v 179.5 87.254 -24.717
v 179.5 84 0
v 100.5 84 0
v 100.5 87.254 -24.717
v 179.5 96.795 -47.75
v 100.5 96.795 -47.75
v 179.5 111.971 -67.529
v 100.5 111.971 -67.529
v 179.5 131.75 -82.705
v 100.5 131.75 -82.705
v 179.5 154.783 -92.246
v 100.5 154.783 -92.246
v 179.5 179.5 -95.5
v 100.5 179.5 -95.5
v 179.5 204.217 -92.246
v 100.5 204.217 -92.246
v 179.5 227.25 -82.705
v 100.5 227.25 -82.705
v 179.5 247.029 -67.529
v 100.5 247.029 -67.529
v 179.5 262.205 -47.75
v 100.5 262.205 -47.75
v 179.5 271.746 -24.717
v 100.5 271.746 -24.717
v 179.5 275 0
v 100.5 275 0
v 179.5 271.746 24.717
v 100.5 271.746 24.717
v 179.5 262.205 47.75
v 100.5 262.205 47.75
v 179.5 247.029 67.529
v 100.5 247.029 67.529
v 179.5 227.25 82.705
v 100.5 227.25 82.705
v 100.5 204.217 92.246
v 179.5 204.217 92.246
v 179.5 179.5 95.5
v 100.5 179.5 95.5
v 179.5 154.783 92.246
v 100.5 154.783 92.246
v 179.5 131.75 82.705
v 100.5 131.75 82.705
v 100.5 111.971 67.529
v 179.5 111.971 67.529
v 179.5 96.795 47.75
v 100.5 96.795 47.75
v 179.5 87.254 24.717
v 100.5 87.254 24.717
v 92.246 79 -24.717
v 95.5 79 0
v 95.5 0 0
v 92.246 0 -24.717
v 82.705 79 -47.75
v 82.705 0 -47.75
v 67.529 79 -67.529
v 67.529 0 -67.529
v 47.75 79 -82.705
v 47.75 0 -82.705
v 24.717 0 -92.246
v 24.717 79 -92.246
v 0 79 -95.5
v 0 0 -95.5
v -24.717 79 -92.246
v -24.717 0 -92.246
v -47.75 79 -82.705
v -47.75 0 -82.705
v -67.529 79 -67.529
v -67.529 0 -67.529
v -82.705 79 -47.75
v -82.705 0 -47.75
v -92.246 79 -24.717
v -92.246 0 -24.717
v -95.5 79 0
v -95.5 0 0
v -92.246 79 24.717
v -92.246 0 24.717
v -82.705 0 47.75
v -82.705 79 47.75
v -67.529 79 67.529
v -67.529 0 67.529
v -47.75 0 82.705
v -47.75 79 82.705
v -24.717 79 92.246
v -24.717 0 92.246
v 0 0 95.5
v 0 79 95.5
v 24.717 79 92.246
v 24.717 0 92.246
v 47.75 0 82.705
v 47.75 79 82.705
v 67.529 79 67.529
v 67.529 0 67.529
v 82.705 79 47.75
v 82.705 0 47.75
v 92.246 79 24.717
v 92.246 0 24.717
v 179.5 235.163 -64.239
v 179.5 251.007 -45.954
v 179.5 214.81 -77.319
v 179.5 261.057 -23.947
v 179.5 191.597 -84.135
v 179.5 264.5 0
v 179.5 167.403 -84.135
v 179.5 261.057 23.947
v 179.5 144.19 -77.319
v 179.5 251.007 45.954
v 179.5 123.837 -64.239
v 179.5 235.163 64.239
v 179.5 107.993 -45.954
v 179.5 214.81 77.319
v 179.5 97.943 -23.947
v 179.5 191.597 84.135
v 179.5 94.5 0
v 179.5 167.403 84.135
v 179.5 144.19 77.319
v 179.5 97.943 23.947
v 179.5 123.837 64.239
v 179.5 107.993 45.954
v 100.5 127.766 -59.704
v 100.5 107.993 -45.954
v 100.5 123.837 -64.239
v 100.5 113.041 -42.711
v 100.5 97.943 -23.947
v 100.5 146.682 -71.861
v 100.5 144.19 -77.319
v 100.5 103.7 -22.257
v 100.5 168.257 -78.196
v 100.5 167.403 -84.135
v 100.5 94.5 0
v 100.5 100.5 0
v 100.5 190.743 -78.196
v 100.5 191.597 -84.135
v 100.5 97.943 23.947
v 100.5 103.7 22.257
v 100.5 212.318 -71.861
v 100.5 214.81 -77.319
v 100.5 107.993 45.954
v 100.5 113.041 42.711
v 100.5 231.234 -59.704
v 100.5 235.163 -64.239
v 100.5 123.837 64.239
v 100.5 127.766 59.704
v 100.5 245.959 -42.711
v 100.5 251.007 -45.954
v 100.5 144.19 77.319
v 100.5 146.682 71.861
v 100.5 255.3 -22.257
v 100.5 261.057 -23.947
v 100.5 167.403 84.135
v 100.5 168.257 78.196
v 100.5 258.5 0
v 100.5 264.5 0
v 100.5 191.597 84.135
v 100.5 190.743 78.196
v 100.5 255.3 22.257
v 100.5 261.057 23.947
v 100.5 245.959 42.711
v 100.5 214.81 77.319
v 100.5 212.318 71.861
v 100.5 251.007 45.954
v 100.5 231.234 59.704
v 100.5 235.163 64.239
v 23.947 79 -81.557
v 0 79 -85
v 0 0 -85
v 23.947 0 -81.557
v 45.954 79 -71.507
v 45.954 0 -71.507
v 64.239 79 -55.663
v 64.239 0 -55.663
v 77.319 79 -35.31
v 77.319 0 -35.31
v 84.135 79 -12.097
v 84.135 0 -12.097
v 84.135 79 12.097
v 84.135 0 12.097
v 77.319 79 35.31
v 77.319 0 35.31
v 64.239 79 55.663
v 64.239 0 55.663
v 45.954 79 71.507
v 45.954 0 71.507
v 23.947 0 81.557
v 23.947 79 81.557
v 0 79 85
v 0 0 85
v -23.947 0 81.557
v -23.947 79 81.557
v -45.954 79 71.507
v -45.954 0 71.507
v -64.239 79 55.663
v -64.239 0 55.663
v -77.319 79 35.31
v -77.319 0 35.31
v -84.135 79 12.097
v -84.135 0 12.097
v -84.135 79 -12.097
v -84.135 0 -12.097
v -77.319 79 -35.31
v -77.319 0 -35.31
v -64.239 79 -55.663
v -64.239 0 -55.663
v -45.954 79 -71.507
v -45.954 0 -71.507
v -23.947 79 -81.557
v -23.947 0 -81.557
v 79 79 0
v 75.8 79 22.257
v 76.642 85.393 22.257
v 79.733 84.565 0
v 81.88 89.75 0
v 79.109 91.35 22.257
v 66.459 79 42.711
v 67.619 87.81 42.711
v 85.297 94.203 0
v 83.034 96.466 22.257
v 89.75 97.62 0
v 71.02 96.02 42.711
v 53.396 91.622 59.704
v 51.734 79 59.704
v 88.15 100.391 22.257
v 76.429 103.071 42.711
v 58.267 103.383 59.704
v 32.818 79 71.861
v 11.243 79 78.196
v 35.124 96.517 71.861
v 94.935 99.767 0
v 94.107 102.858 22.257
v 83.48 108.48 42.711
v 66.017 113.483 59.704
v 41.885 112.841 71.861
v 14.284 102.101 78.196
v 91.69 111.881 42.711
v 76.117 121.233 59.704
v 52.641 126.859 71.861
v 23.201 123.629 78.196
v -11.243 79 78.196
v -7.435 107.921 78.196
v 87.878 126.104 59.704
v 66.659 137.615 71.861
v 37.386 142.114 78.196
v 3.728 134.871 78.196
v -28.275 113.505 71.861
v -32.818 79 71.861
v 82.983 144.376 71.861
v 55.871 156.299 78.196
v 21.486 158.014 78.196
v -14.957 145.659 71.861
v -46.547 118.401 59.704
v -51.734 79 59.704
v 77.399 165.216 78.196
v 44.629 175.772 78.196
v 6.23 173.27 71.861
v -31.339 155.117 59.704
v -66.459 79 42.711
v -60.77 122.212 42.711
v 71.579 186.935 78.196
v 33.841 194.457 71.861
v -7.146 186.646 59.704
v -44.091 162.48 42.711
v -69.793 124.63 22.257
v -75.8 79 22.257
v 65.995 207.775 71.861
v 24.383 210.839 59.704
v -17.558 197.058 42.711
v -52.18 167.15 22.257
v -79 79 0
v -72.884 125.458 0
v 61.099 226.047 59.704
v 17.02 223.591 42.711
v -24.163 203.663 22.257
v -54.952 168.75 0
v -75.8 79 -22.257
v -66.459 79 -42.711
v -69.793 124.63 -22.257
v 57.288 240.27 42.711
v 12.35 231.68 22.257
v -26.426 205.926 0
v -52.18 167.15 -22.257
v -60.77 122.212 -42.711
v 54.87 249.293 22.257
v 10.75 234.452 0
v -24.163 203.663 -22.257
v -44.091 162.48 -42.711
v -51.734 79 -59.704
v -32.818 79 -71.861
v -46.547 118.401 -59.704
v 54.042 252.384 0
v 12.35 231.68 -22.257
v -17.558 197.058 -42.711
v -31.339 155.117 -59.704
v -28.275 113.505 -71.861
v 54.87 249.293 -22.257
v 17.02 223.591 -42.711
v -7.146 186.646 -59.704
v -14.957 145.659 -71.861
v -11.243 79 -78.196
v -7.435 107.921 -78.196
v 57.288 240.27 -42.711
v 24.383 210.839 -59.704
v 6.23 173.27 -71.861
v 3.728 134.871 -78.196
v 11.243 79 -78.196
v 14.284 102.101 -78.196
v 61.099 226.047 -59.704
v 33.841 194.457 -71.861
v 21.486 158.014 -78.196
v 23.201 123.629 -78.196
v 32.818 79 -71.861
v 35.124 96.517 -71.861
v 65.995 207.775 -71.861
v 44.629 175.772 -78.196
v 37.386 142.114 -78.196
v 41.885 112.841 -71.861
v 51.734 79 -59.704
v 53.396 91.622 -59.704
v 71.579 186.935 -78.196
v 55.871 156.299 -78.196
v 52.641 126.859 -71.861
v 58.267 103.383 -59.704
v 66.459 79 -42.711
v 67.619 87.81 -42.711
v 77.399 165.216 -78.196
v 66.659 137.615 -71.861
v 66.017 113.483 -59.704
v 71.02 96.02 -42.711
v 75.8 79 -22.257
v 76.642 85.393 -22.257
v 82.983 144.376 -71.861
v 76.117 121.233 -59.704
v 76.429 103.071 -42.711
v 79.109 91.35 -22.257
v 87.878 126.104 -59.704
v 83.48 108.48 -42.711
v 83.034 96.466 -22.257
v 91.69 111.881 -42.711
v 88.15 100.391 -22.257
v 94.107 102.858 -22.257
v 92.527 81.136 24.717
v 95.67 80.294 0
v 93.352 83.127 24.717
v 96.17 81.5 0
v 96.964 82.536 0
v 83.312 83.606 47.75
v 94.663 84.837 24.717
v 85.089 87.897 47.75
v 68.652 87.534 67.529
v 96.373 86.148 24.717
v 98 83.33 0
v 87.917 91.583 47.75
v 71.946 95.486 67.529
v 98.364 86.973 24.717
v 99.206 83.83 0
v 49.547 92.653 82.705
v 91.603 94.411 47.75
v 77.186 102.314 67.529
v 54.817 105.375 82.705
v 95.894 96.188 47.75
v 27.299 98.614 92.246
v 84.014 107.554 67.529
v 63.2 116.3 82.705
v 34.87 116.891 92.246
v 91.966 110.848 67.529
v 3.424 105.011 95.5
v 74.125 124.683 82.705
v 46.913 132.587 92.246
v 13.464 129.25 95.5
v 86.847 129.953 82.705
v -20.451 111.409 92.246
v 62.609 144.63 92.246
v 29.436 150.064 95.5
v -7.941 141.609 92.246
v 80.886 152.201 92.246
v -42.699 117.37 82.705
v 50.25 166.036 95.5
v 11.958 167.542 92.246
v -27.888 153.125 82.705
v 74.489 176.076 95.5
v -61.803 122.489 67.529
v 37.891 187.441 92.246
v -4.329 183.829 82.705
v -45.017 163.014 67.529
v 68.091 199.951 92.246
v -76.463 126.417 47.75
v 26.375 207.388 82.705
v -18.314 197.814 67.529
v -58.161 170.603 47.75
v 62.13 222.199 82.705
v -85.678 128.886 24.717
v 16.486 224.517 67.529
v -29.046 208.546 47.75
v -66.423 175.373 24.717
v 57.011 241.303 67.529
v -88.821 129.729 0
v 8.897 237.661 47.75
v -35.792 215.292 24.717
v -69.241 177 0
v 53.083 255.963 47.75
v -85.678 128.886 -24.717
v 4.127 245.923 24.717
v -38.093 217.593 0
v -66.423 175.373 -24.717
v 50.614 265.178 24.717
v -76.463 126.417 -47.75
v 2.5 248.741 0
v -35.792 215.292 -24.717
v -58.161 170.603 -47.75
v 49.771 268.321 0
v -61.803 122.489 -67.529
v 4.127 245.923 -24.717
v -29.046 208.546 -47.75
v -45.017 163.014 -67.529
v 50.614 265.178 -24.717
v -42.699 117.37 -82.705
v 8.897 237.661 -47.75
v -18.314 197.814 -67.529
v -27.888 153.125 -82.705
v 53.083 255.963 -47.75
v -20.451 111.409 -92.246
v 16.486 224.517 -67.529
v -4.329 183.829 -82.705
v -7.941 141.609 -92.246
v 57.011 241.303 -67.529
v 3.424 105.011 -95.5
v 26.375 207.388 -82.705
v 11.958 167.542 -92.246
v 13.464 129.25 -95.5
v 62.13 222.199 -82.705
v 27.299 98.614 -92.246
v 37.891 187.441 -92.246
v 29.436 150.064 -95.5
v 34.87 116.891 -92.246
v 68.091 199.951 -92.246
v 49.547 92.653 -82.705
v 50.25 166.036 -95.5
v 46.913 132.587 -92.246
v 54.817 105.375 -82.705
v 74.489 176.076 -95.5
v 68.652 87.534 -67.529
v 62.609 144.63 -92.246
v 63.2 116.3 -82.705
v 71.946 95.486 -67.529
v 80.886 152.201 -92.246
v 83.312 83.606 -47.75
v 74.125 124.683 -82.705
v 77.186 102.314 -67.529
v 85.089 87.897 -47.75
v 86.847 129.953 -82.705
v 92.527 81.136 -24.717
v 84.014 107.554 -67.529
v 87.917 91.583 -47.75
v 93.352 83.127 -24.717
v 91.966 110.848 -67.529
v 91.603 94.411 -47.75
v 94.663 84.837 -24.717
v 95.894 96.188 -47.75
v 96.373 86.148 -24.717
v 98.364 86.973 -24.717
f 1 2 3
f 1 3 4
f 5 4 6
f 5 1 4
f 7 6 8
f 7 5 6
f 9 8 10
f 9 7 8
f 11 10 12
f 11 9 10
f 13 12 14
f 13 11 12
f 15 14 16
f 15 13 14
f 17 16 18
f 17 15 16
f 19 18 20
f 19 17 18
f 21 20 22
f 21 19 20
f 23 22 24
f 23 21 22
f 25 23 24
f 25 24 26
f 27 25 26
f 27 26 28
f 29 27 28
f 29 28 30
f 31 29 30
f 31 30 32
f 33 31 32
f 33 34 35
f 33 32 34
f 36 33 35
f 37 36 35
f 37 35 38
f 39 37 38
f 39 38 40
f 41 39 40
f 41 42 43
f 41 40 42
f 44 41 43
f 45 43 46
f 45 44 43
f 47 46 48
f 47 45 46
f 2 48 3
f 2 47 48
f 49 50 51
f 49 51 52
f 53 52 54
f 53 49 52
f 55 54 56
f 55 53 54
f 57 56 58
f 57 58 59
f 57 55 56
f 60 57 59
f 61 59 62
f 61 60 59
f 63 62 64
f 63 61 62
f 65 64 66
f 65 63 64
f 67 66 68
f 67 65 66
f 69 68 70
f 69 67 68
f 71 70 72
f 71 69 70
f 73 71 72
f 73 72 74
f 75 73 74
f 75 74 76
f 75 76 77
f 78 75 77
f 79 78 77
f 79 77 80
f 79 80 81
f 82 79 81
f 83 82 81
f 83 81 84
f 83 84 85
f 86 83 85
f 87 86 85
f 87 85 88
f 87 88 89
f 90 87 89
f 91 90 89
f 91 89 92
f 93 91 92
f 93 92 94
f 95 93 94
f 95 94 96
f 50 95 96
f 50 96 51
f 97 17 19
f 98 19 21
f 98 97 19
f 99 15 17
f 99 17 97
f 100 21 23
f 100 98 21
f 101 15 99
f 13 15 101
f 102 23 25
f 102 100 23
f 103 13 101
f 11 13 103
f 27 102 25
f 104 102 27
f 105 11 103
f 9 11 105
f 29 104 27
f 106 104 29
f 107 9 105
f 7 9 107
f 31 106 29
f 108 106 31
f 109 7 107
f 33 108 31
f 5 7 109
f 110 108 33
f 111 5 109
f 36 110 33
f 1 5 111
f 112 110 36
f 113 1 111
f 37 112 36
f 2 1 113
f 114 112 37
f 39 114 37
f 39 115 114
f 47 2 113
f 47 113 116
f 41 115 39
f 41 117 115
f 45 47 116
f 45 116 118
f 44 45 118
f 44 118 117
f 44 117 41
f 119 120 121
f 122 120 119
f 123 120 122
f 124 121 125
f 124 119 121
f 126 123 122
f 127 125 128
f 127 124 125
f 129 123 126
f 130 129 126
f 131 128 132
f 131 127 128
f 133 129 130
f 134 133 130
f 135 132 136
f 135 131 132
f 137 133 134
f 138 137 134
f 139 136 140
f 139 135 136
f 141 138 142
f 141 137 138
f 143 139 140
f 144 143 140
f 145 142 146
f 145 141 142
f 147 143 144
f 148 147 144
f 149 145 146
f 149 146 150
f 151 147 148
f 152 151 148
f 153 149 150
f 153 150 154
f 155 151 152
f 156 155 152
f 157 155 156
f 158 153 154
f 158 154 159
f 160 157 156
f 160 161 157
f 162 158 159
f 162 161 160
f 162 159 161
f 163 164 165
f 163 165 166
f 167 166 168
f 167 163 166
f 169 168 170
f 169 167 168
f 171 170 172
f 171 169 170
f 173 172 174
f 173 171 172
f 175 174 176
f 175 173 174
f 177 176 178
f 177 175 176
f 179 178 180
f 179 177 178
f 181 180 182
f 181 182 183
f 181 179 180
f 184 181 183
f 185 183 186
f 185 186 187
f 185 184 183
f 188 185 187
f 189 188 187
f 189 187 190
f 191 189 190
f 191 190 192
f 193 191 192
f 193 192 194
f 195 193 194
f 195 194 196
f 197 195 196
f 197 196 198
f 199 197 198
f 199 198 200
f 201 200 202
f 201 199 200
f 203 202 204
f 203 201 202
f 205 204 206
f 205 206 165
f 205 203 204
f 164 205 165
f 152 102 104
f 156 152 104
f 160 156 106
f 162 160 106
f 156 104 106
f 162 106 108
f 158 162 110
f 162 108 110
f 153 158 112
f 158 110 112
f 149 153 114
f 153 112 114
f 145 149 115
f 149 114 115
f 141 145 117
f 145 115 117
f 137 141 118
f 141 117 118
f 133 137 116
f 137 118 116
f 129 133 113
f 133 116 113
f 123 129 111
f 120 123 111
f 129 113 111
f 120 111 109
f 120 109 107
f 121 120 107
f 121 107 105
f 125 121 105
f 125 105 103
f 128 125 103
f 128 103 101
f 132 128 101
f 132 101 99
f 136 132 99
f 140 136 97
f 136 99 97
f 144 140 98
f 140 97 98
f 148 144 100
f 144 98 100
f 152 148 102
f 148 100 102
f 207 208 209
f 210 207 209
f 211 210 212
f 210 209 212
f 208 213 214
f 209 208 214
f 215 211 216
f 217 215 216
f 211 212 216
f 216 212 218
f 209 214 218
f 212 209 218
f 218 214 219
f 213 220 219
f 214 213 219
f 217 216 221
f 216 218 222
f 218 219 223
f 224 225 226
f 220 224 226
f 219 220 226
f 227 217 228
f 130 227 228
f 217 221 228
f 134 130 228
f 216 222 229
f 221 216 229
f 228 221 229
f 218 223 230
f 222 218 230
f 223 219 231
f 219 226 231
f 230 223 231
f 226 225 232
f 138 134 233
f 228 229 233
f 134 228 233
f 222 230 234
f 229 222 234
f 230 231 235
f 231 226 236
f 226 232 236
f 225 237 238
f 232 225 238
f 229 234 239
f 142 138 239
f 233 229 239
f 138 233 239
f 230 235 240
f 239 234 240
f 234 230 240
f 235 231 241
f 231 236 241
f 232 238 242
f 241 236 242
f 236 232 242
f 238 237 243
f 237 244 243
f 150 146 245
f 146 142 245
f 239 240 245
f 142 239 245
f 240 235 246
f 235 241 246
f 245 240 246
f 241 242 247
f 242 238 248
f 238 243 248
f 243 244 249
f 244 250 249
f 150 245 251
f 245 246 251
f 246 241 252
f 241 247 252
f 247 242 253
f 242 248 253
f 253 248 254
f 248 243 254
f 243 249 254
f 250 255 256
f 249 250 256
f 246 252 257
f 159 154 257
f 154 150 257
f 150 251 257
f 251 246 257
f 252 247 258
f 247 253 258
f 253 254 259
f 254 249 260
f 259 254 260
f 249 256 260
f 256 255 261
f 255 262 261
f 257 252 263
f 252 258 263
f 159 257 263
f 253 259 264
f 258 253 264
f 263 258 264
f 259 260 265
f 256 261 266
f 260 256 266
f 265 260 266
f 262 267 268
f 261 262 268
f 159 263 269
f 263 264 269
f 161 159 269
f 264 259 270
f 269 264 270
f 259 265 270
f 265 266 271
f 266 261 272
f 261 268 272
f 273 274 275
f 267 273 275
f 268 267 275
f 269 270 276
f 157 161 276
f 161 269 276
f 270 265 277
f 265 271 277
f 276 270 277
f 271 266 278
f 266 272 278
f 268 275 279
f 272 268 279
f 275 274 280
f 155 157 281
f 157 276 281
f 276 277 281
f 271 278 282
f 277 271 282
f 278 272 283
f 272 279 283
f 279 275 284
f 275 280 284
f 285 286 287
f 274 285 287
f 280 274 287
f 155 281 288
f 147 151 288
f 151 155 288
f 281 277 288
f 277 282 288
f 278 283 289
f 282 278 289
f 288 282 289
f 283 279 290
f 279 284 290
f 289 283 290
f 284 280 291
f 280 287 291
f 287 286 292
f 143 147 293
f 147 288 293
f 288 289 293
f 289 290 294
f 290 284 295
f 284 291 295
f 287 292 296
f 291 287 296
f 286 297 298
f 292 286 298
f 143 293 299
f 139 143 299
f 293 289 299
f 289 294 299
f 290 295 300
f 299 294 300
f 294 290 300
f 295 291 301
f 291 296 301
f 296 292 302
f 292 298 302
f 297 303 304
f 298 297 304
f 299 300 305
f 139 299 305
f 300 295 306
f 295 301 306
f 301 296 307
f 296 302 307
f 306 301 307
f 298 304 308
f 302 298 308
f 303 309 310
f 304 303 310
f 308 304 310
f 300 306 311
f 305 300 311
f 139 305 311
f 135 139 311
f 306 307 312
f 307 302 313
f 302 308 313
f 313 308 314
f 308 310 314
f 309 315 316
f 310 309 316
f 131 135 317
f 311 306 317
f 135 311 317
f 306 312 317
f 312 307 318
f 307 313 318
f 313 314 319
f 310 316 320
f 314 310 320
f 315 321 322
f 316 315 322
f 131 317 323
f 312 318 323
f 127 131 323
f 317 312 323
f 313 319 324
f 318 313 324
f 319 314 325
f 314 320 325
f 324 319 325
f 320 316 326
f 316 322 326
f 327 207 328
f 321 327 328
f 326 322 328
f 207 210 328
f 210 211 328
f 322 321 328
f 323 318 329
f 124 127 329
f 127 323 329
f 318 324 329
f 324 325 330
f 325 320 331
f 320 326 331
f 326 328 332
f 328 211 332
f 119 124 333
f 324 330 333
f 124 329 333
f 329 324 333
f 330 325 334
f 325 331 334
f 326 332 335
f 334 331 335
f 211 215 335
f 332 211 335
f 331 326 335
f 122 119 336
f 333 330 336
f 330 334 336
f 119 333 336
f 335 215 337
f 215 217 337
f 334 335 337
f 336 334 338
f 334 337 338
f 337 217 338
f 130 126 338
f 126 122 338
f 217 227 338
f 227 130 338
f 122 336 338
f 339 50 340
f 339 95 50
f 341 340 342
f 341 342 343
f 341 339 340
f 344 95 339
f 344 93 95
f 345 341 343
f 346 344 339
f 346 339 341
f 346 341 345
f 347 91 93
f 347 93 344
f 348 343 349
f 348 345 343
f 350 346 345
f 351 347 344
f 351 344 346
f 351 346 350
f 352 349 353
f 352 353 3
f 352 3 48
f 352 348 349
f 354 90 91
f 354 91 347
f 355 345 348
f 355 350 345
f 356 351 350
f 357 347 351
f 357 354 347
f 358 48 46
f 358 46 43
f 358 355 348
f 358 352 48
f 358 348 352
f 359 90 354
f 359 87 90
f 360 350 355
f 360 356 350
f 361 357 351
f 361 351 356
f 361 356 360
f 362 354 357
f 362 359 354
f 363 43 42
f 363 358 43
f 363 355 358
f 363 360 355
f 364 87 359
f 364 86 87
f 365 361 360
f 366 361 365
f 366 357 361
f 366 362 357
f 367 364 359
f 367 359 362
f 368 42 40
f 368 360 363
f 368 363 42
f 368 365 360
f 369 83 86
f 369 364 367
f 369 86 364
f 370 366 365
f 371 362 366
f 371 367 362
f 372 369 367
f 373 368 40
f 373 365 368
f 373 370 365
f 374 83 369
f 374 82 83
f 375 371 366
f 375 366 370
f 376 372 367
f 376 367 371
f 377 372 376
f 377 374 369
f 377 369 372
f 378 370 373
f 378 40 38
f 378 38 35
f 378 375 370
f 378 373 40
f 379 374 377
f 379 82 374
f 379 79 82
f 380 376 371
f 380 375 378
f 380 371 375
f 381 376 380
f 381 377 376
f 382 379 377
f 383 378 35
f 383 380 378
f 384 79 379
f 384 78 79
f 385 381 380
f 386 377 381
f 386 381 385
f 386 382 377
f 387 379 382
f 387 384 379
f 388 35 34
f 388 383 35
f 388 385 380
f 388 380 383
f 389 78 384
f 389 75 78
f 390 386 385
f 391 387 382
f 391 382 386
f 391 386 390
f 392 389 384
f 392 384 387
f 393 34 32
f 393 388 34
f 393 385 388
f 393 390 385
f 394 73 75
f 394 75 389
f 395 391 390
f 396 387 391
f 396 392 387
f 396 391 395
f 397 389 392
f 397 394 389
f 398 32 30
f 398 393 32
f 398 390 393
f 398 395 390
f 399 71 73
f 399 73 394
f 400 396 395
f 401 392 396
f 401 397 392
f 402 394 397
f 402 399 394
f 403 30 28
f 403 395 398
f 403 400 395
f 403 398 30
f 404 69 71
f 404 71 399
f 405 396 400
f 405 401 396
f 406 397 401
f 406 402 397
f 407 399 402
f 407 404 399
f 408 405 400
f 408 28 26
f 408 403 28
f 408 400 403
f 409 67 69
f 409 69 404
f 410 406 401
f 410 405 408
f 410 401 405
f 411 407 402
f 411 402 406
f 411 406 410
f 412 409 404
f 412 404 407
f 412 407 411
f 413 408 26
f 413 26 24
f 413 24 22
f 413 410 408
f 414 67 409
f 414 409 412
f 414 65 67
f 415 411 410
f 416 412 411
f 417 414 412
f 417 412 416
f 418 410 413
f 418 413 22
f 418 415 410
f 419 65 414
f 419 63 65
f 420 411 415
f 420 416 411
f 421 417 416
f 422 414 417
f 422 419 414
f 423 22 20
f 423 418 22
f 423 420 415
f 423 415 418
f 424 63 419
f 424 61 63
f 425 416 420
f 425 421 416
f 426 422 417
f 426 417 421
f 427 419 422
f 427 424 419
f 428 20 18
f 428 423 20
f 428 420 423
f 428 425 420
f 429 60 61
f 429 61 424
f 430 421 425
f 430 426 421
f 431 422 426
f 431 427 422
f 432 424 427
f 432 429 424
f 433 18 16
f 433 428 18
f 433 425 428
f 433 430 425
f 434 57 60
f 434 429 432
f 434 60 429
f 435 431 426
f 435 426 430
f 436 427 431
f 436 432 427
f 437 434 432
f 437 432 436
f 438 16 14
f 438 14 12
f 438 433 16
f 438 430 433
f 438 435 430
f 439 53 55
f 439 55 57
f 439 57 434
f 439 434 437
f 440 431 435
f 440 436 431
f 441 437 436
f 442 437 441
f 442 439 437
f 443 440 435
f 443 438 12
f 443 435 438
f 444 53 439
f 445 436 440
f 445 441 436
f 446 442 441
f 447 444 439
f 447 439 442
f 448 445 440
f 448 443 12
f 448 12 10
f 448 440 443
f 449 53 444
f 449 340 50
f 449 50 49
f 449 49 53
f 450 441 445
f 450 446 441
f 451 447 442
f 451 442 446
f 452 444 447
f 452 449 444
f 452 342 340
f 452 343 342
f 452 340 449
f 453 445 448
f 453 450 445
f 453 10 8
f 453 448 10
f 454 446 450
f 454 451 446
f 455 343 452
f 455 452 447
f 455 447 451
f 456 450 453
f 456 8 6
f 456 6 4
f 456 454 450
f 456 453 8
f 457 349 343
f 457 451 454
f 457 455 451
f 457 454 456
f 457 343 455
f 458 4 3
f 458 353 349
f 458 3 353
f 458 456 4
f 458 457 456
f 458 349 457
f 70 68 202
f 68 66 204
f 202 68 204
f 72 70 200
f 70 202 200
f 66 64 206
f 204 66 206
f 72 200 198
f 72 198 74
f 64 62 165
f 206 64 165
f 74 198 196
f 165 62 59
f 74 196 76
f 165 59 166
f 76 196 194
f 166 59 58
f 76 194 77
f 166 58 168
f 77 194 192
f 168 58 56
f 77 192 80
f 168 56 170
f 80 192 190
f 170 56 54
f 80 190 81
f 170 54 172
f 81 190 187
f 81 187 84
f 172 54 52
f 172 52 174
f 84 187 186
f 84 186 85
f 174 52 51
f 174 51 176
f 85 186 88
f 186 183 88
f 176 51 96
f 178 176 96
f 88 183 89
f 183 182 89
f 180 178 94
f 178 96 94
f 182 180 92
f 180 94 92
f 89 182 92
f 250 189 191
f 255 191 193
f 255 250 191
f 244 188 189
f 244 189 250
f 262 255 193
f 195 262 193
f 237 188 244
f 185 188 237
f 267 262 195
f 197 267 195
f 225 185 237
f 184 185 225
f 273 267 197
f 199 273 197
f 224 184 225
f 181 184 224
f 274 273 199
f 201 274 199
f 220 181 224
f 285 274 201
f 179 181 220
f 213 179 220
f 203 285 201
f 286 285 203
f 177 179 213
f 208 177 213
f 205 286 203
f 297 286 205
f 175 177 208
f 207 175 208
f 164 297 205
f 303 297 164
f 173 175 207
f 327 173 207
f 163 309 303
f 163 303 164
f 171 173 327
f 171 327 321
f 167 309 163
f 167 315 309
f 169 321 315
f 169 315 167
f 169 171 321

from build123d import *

# Parameters (mm, degrees)
CROQUIS4_R            = 95.5
CROQUIS4_R_2          = 79
CORTAR_EXTRUIR1_START = -79
CROQUIS6_R            = 85
CROQUIS6_R_2          = 79
CORTAR_EXTRUIR1_DEPTH = 79
CROQUIS7_R            = 85
CROQUIS7_R_2          = 79
CORTAR_EXTRUIR2_DEPTH = 79


with BuildPart() as part:
    # Barrer5: sweep along a path in Croquis3
    with BuildLine(Plane.XY) as barrer5_path:
        Line((0, 0), (0, 79))
        ThreePointArc((0, 79), (29.435768491, 150.064231509), (100.5, 179.5))
        Line((100.5, 179.5), (179.5, 179.5))
    # Croquis4 → Barrer5 (sweep)
    with BuildSketch(Plane(origin=(0, 0, 0), x_dir=(1, 0, 0), z_dir=(0, 1, 0))):
        Circle(CROQUIS4_R)
        Circle(CROQUIS4_R_2, mode=Mode.SUBTRACT)
    sweep(path=barrer5_path.line)

    # Croquis6 → Cortar-Extruir1 (cut)
    with BuildSketch(Plane.XZ.offset(CORTAR_EXTRUIR1_START)):
        with Locations(Location((0, 0, 0), (0, 0, 270))):
            Circle(CROQUIS6_R)
        Circle(CROQUIS6_R_2, mode=Mode.SUBTRACT)
    extrude(amount=CORTAR_EXTRUIR1_DEPTH, mode=Mode.SUBTRACT)

    # Croquis7 → Cortar-Extruir2 (cut)
    with BuildSketch(Plane(origin=(179.5, 0, 0), x_dir=(0, 0, -1), z_dir=(1, 0, 0))):
        with Locations(Location((0, 179.5, 0), (0, 0, 90))):
            Circle(CROQUIS7_R)
        with Locations((0, 179.5)):
            Circle(CROQUIS7_R_2, mode=Mode.SUBTRACT)
    extrude(amount=-CORTAR_EXTRUIR2_DEPTH, mode=Mode.SUBTRACT)


solid = part.part
